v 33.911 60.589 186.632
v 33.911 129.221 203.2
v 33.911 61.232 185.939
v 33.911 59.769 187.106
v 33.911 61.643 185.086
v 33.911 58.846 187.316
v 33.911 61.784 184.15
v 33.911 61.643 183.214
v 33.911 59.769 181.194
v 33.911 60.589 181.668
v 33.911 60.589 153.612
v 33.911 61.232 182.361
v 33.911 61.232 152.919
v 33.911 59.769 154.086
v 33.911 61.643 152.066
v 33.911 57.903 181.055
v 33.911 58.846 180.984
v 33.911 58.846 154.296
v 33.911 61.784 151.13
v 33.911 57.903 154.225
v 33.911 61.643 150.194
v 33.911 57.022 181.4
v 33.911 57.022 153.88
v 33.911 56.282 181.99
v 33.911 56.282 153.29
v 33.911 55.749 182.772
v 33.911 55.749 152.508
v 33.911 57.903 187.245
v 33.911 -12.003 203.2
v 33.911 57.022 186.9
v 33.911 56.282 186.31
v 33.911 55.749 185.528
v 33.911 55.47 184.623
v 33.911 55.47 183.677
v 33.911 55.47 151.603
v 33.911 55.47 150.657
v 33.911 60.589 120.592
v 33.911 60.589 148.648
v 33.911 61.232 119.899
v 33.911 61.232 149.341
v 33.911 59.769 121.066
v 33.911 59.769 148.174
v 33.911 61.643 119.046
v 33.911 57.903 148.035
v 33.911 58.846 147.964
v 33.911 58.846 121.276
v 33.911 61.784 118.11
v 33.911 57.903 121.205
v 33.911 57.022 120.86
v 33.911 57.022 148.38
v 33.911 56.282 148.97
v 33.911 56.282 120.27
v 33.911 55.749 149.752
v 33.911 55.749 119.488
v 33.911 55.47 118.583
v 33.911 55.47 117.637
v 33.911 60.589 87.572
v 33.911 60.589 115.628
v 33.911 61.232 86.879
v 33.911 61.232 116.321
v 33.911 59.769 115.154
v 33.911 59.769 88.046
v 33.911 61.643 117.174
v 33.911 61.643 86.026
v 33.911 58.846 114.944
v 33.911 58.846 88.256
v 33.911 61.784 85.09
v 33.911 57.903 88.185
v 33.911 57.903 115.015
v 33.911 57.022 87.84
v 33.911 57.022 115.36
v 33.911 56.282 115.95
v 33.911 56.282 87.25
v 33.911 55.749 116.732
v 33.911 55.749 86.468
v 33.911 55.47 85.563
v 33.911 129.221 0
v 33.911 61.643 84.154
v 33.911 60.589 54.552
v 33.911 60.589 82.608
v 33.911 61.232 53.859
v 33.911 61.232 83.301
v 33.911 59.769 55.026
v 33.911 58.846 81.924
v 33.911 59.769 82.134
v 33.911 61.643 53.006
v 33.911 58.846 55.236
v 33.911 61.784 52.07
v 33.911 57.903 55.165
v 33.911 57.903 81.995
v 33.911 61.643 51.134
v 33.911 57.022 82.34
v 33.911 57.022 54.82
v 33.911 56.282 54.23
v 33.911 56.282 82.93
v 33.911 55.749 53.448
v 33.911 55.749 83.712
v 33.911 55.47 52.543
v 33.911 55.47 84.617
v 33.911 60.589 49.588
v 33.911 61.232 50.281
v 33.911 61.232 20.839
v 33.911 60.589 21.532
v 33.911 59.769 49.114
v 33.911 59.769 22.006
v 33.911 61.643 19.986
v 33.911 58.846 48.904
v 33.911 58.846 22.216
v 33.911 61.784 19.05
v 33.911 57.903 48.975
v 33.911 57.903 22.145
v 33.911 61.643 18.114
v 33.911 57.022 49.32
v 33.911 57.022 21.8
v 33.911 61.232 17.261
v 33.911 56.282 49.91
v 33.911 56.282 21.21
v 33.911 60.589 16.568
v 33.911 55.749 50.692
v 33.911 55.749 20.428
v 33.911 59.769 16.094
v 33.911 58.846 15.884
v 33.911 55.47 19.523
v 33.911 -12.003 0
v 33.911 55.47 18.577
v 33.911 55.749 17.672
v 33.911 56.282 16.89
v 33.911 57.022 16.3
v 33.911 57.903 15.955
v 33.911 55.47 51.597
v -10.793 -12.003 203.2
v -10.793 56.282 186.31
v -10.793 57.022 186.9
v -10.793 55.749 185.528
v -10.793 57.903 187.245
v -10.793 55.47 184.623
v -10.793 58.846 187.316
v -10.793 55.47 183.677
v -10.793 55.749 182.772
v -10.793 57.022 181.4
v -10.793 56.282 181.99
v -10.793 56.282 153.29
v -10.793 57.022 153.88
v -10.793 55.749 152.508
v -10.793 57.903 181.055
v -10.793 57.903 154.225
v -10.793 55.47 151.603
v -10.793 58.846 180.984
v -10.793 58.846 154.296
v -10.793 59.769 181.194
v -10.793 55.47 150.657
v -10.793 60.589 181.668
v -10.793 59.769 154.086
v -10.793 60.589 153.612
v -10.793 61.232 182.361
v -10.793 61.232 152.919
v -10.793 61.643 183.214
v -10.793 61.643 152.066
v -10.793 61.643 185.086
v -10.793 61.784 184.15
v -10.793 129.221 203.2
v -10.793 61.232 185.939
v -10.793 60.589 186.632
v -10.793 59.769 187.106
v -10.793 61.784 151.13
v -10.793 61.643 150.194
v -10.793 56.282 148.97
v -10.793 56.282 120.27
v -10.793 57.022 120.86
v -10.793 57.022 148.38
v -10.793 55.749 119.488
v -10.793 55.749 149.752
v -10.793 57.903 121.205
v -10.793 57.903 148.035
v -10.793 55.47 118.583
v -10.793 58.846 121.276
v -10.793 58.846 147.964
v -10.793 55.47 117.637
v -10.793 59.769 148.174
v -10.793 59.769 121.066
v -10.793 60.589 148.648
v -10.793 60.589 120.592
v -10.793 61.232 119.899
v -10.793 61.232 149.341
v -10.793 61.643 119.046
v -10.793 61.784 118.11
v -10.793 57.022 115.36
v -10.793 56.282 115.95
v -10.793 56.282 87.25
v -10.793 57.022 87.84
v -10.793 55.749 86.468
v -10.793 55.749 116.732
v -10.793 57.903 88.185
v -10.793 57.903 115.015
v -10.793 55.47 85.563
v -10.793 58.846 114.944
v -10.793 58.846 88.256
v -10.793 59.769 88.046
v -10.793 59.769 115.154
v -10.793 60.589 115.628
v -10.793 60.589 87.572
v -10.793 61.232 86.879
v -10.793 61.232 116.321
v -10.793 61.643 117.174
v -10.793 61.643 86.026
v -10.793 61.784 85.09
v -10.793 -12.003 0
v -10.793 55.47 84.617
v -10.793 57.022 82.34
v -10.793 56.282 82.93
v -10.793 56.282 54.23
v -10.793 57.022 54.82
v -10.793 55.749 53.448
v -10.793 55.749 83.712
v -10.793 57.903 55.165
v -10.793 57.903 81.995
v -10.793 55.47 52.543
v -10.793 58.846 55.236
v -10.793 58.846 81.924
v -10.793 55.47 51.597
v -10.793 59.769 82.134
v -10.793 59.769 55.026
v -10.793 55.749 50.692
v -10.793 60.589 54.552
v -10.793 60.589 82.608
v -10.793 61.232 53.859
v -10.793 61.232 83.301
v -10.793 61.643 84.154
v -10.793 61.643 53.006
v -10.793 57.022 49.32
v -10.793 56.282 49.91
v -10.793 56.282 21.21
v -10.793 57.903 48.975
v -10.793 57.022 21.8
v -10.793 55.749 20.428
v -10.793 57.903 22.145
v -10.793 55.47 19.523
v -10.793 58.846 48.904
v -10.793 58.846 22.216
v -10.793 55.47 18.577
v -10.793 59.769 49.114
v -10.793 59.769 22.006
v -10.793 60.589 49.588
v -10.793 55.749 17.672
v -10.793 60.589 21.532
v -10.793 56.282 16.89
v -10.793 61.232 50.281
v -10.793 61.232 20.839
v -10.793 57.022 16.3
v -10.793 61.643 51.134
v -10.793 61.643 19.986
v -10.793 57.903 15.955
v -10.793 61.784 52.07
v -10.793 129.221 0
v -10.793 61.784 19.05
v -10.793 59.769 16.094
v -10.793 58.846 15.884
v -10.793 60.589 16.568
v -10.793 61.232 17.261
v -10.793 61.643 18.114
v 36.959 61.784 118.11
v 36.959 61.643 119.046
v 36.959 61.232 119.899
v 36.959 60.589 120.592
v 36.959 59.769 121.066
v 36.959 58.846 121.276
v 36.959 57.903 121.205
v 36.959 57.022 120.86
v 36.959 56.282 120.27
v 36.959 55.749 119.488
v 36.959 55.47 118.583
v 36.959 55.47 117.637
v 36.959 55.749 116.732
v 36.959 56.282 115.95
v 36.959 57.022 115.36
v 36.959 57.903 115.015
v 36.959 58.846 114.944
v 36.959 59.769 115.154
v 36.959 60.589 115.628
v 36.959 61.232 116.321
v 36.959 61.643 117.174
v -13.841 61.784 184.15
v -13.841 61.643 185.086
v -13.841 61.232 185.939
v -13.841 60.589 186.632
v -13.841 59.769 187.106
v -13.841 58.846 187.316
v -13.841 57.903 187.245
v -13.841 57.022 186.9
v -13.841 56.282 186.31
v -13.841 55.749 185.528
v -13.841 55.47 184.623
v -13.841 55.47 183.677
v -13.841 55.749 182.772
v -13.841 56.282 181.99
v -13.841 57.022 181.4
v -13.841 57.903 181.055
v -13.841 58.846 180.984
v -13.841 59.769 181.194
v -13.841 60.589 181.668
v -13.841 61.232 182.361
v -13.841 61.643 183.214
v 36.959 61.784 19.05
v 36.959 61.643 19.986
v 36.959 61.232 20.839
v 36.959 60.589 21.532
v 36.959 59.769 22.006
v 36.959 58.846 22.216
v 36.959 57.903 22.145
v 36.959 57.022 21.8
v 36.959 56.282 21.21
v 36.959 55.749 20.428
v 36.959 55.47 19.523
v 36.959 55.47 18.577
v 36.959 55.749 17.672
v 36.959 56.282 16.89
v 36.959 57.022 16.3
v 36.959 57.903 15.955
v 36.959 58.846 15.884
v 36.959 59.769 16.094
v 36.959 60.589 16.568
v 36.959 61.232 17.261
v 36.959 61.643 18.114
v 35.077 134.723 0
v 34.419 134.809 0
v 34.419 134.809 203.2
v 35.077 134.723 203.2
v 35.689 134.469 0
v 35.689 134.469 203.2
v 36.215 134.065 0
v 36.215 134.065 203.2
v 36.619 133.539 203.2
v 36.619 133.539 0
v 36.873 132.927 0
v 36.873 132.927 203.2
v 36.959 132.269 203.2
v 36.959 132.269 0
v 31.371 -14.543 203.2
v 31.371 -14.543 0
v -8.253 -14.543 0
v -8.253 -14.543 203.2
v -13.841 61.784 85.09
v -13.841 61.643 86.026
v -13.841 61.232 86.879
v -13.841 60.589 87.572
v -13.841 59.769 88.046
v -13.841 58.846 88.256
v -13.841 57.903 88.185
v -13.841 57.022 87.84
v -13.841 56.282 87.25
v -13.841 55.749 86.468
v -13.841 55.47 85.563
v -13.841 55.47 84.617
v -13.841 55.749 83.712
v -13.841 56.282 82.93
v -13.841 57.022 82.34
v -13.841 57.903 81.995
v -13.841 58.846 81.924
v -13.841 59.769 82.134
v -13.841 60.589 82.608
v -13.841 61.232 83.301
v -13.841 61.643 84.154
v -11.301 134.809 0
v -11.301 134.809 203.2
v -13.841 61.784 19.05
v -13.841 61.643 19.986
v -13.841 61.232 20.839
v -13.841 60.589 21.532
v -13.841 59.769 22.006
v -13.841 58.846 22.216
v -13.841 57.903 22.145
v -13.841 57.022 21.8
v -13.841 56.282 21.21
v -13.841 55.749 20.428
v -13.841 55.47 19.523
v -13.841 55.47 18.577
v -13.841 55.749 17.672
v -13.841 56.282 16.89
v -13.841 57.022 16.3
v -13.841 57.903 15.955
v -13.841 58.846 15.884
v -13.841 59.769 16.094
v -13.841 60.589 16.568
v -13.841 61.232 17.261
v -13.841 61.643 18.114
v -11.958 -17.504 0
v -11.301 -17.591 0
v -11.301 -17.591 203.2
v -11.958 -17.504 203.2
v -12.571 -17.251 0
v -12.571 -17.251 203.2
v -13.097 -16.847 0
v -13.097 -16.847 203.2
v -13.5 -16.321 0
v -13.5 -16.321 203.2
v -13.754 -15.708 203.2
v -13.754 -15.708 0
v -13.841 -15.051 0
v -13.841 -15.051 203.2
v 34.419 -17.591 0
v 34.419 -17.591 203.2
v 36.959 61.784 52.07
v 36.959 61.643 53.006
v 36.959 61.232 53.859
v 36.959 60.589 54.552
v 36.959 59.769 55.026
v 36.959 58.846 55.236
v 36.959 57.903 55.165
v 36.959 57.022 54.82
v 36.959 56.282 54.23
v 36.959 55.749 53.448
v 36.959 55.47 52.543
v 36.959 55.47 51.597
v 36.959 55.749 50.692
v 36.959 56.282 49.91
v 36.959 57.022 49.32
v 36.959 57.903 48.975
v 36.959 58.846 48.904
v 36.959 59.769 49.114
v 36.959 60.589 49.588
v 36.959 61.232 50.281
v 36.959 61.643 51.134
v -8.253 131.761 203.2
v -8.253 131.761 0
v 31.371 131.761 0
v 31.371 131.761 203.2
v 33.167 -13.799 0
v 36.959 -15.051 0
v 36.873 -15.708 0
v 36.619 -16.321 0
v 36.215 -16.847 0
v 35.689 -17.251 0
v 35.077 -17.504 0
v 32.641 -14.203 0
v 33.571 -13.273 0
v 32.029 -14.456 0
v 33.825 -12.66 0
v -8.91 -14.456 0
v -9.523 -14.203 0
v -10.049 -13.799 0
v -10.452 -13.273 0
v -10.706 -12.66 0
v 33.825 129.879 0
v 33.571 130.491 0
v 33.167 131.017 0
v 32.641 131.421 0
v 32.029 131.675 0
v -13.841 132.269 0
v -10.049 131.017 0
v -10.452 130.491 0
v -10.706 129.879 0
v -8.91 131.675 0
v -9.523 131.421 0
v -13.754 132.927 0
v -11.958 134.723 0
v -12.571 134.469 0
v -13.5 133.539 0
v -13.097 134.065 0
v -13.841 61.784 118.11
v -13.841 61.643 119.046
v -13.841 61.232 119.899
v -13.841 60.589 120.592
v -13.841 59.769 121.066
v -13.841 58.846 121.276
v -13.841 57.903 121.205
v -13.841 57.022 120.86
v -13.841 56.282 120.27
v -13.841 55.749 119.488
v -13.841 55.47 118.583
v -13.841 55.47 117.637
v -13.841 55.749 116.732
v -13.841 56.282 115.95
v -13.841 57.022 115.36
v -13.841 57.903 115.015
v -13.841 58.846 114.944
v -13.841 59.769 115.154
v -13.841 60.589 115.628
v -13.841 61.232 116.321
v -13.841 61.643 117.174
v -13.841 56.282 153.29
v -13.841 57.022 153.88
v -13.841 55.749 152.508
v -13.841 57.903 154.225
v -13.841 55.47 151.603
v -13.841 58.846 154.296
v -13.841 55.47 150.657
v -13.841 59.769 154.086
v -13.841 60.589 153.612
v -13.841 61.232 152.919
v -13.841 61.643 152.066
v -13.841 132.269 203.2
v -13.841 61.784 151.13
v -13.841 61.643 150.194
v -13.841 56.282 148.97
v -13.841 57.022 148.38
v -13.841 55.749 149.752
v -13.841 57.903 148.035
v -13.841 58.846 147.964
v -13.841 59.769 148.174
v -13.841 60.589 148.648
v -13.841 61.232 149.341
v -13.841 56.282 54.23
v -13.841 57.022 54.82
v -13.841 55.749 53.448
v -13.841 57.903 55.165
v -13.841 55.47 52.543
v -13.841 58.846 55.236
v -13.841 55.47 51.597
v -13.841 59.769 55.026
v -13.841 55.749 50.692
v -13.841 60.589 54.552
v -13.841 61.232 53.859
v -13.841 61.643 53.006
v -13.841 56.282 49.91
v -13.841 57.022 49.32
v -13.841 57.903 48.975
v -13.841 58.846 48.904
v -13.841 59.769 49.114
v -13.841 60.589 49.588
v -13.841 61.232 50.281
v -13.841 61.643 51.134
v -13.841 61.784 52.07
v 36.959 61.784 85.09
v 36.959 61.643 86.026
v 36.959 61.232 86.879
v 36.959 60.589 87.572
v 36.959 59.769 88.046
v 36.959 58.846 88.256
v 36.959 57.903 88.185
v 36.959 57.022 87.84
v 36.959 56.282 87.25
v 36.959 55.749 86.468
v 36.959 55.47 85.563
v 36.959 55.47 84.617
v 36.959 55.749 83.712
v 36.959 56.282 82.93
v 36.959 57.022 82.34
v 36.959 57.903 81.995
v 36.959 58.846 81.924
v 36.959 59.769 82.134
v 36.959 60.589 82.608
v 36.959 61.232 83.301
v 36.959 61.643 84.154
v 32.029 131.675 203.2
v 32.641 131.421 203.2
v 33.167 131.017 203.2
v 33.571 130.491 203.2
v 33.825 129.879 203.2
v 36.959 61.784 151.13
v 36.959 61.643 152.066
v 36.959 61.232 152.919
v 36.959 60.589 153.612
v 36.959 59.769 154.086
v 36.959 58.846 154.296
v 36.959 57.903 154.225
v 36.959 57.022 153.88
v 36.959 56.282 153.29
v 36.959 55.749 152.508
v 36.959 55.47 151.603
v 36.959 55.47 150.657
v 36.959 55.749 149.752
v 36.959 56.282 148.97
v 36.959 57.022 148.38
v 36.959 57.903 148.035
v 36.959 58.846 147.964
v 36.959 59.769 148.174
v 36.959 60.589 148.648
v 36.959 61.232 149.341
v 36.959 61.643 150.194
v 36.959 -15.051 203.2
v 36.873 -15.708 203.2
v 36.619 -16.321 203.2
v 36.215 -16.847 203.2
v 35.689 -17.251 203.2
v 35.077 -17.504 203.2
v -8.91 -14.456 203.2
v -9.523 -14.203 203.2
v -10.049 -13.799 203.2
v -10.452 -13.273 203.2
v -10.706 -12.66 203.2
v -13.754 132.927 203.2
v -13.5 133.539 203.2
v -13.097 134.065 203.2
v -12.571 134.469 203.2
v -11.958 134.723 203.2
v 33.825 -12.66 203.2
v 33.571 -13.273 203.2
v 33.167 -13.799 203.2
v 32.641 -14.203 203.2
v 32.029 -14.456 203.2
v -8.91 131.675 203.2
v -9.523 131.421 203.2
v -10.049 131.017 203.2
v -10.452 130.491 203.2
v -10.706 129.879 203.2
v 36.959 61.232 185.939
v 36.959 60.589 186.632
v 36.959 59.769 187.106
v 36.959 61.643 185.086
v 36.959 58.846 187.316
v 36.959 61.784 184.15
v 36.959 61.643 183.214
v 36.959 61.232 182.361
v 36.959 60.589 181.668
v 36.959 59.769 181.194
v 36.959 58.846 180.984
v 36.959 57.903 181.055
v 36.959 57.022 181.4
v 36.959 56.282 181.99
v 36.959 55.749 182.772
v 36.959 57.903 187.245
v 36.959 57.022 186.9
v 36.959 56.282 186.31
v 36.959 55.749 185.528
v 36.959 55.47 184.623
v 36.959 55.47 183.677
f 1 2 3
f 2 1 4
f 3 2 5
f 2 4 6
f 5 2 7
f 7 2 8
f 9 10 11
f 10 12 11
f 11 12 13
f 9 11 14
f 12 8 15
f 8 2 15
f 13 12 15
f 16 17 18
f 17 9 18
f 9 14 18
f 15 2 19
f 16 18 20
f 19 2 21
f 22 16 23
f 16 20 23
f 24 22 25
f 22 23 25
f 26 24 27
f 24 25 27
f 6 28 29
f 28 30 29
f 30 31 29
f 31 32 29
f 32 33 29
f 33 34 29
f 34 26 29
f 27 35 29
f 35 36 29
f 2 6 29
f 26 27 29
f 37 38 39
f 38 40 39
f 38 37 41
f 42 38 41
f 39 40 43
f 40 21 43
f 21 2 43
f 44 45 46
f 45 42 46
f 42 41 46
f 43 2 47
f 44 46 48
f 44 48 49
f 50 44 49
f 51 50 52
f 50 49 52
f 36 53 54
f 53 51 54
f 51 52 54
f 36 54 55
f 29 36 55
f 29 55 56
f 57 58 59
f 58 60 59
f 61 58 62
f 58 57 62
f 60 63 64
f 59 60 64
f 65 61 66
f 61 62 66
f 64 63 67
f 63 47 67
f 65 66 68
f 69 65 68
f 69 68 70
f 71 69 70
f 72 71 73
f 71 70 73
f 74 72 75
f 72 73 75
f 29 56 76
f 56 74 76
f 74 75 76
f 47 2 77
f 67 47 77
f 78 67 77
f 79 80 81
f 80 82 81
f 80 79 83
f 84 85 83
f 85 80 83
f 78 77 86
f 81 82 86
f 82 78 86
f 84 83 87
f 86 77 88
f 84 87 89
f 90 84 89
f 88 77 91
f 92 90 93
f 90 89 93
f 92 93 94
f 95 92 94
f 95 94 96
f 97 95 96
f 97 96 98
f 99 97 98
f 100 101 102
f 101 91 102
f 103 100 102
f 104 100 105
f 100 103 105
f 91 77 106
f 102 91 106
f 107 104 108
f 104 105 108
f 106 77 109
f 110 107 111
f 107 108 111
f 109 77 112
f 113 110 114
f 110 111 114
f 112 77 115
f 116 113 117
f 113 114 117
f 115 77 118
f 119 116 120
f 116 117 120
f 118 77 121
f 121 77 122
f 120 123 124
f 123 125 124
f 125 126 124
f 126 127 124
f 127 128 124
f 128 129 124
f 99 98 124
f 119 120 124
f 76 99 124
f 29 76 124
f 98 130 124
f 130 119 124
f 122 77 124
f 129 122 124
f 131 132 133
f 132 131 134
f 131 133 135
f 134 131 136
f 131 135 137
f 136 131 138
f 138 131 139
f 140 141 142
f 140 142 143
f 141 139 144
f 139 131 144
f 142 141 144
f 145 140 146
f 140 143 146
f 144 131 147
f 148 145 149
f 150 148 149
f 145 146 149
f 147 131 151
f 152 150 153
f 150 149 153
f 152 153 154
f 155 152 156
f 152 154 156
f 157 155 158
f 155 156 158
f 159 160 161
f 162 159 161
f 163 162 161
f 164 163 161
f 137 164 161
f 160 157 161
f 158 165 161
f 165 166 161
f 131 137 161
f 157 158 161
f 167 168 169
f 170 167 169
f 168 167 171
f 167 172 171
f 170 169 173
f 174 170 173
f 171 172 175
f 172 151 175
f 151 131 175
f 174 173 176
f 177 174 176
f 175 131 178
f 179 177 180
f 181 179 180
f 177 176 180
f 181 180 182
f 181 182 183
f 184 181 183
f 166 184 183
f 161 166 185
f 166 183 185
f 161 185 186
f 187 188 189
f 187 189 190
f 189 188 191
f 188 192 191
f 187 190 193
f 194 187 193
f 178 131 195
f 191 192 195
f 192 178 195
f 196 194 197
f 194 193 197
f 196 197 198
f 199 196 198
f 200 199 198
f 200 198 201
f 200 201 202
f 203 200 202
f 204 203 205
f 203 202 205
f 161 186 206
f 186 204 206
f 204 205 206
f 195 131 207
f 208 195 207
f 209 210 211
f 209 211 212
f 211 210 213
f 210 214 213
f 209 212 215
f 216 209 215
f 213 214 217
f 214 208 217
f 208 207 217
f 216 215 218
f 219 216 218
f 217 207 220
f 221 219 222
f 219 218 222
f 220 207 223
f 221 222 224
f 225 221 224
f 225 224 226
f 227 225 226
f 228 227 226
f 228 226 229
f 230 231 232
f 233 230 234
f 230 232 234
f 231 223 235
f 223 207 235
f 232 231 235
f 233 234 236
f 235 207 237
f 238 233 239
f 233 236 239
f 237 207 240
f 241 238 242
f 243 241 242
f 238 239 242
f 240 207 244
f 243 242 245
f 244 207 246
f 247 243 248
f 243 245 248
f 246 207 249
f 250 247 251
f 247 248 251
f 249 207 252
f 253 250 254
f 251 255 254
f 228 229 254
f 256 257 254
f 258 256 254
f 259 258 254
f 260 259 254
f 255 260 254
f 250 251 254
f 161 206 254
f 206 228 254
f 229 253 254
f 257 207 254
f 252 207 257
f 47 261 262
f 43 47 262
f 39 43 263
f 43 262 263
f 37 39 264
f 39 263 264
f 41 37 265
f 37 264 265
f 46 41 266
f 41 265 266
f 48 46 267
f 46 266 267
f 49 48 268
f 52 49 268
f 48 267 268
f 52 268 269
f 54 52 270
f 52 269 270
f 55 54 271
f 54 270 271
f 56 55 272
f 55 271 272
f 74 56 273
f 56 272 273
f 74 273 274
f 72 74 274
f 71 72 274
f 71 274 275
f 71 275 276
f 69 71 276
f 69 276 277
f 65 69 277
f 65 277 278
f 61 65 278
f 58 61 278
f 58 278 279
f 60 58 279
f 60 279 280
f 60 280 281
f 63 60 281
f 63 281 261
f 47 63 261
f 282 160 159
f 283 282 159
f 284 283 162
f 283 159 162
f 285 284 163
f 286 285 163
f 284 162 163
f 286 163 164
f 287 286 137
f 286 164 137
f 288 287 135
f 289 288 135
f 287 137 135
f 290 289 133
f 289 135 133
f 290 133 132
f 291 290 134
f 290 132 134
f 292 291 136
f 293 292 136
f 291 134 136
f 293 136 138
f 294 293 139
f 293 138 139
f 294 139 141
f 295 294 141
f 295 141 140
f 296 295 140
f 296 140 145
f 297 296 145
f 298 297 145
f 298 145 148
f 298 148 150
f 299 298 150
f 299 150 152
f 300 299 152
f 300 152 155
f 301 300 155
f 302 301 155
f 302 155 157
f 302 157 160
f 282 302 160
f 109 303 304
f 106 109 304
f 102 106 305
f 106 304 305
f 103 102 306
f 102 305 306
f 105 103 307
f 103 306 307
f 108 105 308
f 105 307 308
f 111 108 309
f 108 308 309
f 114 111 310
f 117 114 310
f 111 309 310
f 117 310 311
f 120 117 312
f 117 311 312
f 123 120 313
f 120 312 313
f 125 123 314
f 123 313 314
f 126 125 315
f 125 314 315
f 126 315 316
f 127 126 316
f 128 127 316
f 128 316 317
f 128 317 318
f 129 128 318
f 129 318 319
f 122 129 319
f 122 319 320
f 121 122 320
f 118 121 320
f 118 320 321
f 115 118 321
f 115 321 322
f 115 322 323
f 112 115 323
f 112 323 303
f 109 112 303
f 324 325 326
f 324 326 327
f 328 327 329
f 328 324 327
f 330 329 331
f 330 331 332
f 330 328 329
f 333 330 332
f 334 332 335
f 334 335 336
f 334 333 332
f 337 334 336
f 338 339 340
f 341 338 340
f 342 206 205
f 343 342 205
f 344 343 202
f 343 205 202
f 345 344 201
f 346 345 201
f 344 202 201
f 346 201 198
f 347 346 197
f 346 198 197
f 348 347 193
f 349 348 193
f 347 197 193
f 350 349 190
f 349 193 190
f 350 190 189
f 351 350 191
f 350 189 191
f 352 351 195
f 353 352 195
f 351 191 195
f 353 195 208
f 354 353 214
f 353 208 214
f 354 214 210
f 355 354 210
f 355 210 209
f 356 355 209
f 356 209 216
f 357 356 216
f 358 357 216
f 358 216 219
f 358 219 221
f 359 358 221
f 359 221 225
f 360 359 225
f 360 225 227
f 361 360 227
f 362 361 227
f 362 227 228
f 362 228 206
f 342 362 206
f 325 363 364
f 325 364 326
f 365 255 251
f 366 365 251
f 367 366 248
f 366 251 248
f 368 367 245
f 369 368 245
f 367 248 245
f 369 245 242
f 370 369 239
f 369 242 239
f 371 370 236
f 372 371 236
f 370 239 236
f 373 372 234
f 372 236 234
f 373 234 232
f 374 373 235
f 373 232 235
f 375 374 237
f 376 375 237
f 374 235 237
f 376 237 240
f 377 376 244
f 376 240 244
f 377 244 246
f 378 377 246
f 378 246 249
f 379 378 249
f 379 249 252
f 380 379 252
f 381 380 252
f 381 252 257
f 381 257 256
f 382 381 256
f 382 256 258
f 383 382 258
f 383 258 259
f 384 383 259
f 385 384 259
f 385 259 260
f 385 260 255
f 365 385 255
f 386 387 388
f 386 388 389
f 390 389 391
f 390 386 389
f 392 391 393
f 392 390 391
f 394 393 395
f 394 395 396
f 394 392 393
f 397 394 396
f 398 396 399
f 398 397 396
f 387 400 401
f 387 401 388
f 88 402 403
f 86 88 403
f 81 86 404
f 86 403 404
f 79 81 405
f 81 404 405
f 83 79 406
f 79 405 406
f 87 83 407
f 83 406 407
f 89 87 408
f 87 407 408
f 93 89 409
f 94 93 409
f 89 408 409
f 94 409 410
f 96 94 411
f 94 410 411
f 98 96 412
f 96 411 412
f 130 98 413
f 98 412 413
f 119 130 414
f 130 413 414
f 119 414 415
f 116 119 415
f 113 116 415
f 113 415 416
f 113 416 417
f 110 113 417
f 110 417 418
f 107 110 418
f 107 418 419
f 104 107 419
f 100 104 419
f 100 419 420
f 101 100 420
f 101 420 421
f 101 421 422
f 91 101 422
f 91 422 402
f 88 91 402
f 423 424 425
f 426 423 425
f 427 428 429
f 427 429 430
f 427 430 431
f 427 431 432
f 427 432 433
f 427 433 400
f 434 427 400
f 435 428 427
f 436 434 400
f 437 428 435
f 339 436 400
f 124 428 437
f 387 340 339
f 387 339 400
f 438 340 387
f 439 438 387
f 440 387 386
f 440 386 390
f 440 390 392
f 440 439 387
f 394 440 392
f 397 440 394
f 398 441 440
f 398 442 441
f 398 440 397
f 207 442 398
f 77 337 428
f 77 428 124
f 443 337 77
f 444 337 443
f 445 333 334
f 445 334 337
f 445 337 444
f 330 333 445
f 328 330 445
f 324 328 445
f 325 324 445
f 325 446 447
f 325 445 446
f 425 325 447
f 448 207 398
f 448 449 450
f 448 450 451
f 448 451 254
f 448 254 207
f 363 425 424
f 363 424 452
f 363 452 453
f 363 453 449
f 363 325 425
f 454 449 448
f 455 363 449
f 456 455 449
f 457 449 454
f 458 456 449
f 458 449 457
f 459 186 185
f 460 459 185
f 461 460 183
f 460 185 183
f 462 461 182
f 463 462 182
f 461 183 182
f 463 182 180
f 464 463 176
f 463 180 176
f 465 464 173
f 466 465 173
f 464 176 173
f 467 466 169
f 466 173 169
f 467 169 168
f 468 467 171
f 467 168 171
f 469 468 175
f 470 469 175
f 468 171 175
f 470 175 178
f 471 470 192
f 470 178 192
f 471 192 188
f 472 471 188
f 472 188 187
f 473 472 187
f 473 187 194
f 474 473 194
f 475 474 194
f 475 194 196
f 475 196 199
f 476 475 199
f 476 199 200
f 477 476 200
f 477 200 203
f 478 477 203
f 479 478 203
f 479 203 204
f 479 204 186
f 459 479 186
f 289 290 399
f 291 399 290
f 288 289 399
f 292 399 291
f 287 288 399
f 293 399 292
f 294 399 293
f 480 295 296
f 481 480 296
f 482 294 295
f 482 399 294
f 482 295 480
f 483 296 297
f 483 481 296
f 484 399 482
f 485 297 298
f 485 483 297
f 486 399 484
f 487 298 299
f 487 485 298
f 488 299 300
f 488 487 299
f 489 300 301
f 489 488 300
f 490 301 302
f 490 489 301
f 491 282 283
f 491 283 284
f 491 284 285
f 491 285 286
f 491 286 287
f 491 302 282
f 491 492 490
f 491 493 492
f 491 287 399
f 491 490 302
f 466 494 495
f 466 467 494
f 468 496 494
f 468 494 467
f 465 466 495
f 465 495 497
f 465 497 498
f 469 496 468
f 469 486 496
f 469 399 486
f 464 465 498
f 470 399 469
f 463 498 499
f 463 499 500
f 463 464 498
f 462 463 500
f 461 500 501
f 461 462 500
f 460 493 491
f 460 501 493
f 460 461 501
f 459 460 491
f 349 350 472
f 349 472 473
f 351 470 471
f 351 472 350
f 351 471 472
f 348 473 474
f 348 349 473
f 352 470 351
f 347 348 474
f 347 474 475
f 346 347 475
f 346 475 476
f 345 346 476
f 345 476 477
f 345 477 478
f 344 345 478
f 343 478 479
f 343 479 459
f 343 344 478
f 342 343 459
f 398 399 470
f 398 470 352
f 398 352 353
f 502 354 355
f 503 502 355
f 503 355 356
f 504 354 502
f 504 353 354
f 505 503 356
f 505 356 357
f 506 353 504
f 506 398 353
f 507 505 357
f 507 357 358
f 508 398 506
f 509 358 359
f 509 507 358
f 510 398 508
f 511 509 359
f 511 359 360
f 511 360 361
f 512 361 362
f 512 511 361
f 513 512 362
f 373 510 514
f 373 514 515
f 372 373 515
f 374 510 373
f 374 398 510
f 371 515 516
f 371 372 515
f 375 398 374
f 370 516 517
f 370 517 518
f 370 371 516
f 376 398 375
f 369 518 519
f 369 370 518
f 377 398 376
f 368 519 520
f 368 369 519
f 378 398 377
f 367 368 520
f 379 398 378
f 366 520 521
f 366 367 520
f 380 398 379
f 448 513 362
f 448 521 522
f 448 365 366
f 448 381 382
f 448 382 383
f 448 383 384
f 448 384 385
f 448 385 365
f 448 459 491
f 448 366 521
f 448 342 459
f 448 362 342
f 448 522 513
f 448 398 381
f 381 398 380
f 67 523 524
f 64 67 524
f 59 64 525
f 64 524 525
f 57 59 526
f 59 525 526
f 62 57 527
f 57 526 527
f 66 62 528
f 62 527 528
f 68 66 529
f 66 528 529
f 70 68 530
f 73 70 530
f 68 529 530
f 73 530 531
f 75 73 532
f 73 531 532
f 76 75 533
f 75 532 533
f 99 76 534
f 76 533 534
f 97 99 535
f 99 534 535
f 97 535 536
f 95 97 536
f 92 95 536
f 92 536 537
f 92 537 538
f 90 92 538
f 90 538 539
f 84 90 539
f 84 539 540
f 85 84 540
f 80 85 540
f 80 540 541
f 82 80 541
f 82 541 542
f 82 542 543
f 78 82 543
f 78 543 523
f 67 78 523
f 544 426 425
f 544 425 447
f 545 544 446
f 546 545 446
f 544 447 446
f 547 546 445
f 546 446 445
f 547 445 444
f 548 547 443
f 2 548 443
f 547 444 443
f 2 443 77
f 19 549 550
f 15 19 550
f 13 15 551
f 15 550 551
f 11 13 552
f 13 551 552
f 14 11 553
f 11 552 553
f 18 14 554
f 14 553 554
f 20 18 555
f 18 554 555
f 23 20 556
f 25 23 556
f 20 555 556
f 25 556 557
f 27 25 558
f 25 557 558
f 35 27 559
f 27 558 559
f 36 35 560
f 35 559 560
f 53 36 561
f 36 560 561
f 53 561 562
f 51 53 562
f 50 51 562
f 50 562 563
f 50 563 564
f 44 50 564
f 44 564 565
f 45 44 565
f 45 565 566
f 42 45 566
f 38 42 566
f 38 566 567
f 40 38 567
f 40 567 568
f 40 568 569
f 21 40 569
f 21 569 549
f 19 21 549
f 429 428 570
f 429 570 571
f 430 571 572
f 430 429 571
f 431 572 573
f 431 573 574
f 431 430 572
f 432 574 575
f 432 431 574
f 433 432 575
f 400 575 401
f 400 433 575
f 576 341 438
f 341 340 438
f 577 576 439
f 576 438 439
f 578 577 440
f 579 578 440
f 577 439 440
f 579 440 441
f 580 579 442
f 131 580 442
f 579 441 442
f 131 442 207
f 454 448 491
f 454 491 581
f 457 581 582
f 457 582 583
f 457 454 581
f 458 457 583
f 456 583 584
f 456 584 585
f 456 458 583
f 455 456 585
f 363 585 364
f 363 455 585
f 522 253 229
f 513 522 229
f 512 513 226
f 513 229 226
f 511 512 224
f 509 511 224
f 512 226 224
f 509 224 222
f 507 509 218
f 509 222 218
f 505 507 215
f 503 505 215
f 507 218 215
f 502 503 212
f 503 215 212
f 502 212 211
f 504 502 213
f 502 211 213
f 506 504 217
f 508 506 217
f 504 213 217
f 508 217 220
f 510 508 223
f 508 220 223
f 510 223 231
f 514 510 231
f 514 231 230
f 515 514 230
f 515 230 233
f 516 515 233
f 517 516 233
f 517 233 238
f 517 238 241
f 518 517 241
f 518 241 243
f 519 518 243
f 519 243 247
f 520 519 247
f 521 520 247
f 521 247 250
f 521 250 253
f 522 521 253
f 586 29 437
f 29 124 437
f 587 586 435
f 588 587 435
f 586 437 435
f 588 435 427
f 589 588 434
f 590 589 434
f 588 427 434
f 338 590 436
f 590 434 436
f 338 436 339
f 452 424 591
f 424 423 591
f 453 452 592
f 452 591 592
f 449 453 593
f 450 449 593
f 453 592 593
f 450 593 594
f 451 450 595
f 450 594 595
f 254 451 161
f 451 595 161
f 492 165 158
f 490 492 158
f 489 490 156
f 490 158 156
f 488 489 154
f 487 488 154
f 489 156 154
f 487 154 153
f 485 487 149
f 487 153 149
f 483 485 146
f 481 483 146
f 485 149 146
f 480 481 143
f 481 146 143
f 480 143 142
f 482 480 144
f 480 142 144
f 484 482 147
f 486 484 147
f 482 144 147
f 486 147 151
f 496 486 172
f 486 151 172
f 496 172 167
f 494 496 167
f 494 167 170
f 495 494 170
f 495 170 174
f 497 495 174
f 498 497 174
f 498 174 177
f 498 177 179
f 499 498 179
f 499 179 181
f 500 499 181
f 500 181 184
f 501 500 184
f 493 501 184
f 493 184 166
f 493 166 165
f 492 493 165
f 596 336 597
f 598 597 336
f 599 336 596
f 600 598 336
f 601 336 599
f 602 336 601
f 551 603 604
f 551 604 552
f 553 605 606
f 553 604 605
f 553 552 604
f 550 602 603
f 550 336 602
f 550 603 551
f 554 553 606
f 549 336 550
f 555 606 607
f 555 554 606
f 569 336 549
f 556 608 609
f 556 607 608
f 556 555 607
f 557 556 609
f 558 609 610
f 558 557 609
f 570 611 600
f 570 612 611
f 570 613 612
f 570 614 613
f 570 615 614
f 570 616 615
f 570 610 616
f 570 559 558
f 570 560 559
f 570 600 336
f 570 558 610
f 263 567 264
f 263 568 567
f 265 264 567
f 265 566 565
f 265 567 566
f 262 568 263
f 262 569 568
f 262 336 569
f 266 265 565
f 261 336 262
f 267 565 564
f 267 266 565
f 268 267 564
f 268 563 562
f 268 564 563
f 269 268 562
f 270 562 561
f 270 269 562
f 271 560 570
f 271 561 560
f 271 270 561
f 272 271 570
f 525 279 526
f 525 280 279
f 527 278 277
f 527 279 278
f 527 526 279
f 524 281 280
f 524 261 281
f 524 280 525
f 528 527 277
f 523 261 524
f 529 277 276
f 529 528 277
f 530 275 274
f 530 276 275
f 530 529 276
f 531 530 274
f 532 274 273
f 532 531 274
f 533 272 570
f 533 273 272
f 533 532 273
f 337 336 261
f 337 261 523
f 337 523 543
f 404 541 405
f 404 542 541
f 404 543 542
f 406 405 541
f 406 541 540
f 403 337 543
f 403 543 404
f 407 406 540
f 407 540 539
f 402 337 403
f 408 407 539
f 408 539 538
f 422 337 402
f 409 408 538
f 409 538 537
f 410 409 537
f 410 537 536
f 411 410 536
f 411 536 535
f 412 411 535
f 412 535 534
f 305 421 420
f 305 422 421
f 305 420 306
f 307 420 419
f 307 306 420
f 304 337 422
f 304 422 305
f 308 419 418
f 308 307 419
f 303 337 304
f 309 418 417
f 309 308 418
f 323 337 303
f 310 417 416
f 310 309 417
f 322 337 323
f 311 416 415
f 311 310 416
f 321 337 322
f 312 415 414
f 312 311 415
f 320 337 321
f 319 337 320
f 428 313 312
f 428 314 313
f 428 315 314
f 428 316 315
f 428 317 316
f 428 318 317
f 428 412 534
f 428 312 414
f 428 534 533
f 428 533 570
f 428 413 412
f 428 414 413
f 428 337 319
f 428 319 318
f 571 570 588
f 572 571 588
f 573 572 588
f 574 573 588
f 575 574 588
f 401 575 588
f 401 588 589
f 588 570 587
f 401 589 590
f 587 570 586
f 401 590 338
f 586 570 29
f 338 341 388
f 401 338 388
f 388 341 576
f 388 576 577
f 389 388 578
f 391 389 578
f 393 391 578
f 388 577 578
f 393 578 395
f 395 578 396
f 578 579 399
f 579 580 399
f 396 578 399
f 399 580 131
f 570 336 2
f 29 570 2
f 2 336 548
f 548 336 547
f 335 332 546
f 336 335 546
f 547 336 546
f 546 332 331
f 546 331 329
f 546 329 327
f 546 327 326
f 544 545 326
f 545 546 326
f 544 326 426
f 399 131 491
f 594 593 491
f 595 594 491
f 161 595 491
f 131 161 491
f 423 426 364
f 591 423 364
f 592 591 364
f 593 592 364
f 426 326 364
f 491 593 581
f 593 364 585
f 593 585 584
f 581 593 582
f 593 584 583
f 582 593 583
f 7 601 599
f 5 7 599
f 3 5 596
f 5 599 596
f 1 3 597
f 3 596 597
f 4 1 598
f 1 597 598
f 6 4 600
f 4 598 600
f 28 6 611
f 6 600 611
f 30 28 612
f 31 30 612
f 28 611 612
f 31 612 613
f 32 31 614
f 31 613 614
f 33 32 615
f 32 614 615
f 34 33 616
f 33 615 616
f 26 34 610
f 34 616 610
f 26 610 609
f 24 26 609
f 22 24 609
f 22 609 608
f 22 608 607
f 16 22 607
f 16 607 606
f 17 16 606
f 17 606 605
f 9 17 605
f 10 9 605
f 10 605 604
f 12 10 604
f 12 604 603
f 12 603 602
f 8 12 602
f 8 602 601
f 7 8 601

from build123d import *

# Parameters (mm, degrees)
BOSS_EXTRUDE1_DEPTH = 203.2
SHELL1_T            = -3.048
FILLET1_R           = 2.54
SKETCH2_R           = 3.175
CUT_EXTRUDE1_DEPTH  = 203.2


with BuildPart() as part:
    # Sketch1 → Boss-Extrude1 (new body)
    with BuildSketch(Plane.XY):
        with BuildLine():
            Line((-11.300558575, 134.809128263), (34.419441425, 134.809128263))
            ThreePointArc((34.419441425, 134.809128263), (36.215492649, 134.065179487), (36.959441425, 132.269128263))
            Line((36.959441425, 132.269128263), (36.959441425, -15.050871737))
            ThreePointArc((36.959441425, -15.050871737), (36.215492649, -16.846922961), (34.419441425, -17.590871737))
            Line((34.419441425, -17.590871737), (-11.300558575, -17.590871737))
            ThreePointArc((-11.300558575, -17.590871737), (-13.096609799, -16.846922961), (-13.840558575, -15.050871737))
            Line((-13.840558575, -15.050871737), (-13.840558575, 132.269128263))
            ThreePointArc((-13.840558575, 132.269128263), (-13.096609799, 134.065179487), (-11.300558575, 134.809128263))
        make_face()
    extrude(amount=BOSS_EXTRUDE1_DEPTH)

    # Shell1
    shell1_openings = [part.faces().sort_by_distance(p)[0] for p in [
        (11.559441425, 58.609128263, 203.2),
        (11.559441425, 58.609128263, 0),
    ]]
    offset(amount=SHELL1_T, openings=shell1_openings, kind=Kind.INTERSECTION)

    # Fillet1
    fillet1_edges = [part.edges().sort_by_distance(p)[0] for p in [
        (33.911441425, -14.542871737, 101.6),
        (33.911441425, 131.761128263, 101.6),
        (-10.792558575, 131.761128263, 101.6),
        (-10.792558575, -14.542871737, 101.6),
    ]]
    fillet(fillet1_edges, radius=FILLET1_R)

    # Sketch2 → Cut-Extrude1 (cut)
    with BuildSketch(Plane(origin=(36.959441425, 0, 0), x_dir=(0, 0, -1), z_dir=(1, 0, 0))):
        with Locations(Location((-52.07, 58.609128263, 0), (0, 0, 90))):
            Circle(SKETCH2_R)
        with Locations(Location((-85.09, 58.609128263, 0), (0, 0, 90))):
            Circle(SKETCH2_R)
        with Locations(Location((-118.11, 58.609128263, 0), (0, 0, 90))):
            Circle(SKETCH2_R)
        with Locations(Location((-151.13, 58.609128263, 0), (0, 0, 90))):
            Circle(SKETCH2_R)
        with Locations(Location((-184.15, 58.609128263, 0), (0, 0, 90))):
            Circle(SKETCH2_R)
        with Locations(Location((-19.05, 58.609128263, 0), (0, 0, 90))):
            Circle(SKETCH2_R)
    extrude(amount=-CUT_EXTRUDE1_DEPTH, mode=Mode.SUBTRACT)


solid = part.part
